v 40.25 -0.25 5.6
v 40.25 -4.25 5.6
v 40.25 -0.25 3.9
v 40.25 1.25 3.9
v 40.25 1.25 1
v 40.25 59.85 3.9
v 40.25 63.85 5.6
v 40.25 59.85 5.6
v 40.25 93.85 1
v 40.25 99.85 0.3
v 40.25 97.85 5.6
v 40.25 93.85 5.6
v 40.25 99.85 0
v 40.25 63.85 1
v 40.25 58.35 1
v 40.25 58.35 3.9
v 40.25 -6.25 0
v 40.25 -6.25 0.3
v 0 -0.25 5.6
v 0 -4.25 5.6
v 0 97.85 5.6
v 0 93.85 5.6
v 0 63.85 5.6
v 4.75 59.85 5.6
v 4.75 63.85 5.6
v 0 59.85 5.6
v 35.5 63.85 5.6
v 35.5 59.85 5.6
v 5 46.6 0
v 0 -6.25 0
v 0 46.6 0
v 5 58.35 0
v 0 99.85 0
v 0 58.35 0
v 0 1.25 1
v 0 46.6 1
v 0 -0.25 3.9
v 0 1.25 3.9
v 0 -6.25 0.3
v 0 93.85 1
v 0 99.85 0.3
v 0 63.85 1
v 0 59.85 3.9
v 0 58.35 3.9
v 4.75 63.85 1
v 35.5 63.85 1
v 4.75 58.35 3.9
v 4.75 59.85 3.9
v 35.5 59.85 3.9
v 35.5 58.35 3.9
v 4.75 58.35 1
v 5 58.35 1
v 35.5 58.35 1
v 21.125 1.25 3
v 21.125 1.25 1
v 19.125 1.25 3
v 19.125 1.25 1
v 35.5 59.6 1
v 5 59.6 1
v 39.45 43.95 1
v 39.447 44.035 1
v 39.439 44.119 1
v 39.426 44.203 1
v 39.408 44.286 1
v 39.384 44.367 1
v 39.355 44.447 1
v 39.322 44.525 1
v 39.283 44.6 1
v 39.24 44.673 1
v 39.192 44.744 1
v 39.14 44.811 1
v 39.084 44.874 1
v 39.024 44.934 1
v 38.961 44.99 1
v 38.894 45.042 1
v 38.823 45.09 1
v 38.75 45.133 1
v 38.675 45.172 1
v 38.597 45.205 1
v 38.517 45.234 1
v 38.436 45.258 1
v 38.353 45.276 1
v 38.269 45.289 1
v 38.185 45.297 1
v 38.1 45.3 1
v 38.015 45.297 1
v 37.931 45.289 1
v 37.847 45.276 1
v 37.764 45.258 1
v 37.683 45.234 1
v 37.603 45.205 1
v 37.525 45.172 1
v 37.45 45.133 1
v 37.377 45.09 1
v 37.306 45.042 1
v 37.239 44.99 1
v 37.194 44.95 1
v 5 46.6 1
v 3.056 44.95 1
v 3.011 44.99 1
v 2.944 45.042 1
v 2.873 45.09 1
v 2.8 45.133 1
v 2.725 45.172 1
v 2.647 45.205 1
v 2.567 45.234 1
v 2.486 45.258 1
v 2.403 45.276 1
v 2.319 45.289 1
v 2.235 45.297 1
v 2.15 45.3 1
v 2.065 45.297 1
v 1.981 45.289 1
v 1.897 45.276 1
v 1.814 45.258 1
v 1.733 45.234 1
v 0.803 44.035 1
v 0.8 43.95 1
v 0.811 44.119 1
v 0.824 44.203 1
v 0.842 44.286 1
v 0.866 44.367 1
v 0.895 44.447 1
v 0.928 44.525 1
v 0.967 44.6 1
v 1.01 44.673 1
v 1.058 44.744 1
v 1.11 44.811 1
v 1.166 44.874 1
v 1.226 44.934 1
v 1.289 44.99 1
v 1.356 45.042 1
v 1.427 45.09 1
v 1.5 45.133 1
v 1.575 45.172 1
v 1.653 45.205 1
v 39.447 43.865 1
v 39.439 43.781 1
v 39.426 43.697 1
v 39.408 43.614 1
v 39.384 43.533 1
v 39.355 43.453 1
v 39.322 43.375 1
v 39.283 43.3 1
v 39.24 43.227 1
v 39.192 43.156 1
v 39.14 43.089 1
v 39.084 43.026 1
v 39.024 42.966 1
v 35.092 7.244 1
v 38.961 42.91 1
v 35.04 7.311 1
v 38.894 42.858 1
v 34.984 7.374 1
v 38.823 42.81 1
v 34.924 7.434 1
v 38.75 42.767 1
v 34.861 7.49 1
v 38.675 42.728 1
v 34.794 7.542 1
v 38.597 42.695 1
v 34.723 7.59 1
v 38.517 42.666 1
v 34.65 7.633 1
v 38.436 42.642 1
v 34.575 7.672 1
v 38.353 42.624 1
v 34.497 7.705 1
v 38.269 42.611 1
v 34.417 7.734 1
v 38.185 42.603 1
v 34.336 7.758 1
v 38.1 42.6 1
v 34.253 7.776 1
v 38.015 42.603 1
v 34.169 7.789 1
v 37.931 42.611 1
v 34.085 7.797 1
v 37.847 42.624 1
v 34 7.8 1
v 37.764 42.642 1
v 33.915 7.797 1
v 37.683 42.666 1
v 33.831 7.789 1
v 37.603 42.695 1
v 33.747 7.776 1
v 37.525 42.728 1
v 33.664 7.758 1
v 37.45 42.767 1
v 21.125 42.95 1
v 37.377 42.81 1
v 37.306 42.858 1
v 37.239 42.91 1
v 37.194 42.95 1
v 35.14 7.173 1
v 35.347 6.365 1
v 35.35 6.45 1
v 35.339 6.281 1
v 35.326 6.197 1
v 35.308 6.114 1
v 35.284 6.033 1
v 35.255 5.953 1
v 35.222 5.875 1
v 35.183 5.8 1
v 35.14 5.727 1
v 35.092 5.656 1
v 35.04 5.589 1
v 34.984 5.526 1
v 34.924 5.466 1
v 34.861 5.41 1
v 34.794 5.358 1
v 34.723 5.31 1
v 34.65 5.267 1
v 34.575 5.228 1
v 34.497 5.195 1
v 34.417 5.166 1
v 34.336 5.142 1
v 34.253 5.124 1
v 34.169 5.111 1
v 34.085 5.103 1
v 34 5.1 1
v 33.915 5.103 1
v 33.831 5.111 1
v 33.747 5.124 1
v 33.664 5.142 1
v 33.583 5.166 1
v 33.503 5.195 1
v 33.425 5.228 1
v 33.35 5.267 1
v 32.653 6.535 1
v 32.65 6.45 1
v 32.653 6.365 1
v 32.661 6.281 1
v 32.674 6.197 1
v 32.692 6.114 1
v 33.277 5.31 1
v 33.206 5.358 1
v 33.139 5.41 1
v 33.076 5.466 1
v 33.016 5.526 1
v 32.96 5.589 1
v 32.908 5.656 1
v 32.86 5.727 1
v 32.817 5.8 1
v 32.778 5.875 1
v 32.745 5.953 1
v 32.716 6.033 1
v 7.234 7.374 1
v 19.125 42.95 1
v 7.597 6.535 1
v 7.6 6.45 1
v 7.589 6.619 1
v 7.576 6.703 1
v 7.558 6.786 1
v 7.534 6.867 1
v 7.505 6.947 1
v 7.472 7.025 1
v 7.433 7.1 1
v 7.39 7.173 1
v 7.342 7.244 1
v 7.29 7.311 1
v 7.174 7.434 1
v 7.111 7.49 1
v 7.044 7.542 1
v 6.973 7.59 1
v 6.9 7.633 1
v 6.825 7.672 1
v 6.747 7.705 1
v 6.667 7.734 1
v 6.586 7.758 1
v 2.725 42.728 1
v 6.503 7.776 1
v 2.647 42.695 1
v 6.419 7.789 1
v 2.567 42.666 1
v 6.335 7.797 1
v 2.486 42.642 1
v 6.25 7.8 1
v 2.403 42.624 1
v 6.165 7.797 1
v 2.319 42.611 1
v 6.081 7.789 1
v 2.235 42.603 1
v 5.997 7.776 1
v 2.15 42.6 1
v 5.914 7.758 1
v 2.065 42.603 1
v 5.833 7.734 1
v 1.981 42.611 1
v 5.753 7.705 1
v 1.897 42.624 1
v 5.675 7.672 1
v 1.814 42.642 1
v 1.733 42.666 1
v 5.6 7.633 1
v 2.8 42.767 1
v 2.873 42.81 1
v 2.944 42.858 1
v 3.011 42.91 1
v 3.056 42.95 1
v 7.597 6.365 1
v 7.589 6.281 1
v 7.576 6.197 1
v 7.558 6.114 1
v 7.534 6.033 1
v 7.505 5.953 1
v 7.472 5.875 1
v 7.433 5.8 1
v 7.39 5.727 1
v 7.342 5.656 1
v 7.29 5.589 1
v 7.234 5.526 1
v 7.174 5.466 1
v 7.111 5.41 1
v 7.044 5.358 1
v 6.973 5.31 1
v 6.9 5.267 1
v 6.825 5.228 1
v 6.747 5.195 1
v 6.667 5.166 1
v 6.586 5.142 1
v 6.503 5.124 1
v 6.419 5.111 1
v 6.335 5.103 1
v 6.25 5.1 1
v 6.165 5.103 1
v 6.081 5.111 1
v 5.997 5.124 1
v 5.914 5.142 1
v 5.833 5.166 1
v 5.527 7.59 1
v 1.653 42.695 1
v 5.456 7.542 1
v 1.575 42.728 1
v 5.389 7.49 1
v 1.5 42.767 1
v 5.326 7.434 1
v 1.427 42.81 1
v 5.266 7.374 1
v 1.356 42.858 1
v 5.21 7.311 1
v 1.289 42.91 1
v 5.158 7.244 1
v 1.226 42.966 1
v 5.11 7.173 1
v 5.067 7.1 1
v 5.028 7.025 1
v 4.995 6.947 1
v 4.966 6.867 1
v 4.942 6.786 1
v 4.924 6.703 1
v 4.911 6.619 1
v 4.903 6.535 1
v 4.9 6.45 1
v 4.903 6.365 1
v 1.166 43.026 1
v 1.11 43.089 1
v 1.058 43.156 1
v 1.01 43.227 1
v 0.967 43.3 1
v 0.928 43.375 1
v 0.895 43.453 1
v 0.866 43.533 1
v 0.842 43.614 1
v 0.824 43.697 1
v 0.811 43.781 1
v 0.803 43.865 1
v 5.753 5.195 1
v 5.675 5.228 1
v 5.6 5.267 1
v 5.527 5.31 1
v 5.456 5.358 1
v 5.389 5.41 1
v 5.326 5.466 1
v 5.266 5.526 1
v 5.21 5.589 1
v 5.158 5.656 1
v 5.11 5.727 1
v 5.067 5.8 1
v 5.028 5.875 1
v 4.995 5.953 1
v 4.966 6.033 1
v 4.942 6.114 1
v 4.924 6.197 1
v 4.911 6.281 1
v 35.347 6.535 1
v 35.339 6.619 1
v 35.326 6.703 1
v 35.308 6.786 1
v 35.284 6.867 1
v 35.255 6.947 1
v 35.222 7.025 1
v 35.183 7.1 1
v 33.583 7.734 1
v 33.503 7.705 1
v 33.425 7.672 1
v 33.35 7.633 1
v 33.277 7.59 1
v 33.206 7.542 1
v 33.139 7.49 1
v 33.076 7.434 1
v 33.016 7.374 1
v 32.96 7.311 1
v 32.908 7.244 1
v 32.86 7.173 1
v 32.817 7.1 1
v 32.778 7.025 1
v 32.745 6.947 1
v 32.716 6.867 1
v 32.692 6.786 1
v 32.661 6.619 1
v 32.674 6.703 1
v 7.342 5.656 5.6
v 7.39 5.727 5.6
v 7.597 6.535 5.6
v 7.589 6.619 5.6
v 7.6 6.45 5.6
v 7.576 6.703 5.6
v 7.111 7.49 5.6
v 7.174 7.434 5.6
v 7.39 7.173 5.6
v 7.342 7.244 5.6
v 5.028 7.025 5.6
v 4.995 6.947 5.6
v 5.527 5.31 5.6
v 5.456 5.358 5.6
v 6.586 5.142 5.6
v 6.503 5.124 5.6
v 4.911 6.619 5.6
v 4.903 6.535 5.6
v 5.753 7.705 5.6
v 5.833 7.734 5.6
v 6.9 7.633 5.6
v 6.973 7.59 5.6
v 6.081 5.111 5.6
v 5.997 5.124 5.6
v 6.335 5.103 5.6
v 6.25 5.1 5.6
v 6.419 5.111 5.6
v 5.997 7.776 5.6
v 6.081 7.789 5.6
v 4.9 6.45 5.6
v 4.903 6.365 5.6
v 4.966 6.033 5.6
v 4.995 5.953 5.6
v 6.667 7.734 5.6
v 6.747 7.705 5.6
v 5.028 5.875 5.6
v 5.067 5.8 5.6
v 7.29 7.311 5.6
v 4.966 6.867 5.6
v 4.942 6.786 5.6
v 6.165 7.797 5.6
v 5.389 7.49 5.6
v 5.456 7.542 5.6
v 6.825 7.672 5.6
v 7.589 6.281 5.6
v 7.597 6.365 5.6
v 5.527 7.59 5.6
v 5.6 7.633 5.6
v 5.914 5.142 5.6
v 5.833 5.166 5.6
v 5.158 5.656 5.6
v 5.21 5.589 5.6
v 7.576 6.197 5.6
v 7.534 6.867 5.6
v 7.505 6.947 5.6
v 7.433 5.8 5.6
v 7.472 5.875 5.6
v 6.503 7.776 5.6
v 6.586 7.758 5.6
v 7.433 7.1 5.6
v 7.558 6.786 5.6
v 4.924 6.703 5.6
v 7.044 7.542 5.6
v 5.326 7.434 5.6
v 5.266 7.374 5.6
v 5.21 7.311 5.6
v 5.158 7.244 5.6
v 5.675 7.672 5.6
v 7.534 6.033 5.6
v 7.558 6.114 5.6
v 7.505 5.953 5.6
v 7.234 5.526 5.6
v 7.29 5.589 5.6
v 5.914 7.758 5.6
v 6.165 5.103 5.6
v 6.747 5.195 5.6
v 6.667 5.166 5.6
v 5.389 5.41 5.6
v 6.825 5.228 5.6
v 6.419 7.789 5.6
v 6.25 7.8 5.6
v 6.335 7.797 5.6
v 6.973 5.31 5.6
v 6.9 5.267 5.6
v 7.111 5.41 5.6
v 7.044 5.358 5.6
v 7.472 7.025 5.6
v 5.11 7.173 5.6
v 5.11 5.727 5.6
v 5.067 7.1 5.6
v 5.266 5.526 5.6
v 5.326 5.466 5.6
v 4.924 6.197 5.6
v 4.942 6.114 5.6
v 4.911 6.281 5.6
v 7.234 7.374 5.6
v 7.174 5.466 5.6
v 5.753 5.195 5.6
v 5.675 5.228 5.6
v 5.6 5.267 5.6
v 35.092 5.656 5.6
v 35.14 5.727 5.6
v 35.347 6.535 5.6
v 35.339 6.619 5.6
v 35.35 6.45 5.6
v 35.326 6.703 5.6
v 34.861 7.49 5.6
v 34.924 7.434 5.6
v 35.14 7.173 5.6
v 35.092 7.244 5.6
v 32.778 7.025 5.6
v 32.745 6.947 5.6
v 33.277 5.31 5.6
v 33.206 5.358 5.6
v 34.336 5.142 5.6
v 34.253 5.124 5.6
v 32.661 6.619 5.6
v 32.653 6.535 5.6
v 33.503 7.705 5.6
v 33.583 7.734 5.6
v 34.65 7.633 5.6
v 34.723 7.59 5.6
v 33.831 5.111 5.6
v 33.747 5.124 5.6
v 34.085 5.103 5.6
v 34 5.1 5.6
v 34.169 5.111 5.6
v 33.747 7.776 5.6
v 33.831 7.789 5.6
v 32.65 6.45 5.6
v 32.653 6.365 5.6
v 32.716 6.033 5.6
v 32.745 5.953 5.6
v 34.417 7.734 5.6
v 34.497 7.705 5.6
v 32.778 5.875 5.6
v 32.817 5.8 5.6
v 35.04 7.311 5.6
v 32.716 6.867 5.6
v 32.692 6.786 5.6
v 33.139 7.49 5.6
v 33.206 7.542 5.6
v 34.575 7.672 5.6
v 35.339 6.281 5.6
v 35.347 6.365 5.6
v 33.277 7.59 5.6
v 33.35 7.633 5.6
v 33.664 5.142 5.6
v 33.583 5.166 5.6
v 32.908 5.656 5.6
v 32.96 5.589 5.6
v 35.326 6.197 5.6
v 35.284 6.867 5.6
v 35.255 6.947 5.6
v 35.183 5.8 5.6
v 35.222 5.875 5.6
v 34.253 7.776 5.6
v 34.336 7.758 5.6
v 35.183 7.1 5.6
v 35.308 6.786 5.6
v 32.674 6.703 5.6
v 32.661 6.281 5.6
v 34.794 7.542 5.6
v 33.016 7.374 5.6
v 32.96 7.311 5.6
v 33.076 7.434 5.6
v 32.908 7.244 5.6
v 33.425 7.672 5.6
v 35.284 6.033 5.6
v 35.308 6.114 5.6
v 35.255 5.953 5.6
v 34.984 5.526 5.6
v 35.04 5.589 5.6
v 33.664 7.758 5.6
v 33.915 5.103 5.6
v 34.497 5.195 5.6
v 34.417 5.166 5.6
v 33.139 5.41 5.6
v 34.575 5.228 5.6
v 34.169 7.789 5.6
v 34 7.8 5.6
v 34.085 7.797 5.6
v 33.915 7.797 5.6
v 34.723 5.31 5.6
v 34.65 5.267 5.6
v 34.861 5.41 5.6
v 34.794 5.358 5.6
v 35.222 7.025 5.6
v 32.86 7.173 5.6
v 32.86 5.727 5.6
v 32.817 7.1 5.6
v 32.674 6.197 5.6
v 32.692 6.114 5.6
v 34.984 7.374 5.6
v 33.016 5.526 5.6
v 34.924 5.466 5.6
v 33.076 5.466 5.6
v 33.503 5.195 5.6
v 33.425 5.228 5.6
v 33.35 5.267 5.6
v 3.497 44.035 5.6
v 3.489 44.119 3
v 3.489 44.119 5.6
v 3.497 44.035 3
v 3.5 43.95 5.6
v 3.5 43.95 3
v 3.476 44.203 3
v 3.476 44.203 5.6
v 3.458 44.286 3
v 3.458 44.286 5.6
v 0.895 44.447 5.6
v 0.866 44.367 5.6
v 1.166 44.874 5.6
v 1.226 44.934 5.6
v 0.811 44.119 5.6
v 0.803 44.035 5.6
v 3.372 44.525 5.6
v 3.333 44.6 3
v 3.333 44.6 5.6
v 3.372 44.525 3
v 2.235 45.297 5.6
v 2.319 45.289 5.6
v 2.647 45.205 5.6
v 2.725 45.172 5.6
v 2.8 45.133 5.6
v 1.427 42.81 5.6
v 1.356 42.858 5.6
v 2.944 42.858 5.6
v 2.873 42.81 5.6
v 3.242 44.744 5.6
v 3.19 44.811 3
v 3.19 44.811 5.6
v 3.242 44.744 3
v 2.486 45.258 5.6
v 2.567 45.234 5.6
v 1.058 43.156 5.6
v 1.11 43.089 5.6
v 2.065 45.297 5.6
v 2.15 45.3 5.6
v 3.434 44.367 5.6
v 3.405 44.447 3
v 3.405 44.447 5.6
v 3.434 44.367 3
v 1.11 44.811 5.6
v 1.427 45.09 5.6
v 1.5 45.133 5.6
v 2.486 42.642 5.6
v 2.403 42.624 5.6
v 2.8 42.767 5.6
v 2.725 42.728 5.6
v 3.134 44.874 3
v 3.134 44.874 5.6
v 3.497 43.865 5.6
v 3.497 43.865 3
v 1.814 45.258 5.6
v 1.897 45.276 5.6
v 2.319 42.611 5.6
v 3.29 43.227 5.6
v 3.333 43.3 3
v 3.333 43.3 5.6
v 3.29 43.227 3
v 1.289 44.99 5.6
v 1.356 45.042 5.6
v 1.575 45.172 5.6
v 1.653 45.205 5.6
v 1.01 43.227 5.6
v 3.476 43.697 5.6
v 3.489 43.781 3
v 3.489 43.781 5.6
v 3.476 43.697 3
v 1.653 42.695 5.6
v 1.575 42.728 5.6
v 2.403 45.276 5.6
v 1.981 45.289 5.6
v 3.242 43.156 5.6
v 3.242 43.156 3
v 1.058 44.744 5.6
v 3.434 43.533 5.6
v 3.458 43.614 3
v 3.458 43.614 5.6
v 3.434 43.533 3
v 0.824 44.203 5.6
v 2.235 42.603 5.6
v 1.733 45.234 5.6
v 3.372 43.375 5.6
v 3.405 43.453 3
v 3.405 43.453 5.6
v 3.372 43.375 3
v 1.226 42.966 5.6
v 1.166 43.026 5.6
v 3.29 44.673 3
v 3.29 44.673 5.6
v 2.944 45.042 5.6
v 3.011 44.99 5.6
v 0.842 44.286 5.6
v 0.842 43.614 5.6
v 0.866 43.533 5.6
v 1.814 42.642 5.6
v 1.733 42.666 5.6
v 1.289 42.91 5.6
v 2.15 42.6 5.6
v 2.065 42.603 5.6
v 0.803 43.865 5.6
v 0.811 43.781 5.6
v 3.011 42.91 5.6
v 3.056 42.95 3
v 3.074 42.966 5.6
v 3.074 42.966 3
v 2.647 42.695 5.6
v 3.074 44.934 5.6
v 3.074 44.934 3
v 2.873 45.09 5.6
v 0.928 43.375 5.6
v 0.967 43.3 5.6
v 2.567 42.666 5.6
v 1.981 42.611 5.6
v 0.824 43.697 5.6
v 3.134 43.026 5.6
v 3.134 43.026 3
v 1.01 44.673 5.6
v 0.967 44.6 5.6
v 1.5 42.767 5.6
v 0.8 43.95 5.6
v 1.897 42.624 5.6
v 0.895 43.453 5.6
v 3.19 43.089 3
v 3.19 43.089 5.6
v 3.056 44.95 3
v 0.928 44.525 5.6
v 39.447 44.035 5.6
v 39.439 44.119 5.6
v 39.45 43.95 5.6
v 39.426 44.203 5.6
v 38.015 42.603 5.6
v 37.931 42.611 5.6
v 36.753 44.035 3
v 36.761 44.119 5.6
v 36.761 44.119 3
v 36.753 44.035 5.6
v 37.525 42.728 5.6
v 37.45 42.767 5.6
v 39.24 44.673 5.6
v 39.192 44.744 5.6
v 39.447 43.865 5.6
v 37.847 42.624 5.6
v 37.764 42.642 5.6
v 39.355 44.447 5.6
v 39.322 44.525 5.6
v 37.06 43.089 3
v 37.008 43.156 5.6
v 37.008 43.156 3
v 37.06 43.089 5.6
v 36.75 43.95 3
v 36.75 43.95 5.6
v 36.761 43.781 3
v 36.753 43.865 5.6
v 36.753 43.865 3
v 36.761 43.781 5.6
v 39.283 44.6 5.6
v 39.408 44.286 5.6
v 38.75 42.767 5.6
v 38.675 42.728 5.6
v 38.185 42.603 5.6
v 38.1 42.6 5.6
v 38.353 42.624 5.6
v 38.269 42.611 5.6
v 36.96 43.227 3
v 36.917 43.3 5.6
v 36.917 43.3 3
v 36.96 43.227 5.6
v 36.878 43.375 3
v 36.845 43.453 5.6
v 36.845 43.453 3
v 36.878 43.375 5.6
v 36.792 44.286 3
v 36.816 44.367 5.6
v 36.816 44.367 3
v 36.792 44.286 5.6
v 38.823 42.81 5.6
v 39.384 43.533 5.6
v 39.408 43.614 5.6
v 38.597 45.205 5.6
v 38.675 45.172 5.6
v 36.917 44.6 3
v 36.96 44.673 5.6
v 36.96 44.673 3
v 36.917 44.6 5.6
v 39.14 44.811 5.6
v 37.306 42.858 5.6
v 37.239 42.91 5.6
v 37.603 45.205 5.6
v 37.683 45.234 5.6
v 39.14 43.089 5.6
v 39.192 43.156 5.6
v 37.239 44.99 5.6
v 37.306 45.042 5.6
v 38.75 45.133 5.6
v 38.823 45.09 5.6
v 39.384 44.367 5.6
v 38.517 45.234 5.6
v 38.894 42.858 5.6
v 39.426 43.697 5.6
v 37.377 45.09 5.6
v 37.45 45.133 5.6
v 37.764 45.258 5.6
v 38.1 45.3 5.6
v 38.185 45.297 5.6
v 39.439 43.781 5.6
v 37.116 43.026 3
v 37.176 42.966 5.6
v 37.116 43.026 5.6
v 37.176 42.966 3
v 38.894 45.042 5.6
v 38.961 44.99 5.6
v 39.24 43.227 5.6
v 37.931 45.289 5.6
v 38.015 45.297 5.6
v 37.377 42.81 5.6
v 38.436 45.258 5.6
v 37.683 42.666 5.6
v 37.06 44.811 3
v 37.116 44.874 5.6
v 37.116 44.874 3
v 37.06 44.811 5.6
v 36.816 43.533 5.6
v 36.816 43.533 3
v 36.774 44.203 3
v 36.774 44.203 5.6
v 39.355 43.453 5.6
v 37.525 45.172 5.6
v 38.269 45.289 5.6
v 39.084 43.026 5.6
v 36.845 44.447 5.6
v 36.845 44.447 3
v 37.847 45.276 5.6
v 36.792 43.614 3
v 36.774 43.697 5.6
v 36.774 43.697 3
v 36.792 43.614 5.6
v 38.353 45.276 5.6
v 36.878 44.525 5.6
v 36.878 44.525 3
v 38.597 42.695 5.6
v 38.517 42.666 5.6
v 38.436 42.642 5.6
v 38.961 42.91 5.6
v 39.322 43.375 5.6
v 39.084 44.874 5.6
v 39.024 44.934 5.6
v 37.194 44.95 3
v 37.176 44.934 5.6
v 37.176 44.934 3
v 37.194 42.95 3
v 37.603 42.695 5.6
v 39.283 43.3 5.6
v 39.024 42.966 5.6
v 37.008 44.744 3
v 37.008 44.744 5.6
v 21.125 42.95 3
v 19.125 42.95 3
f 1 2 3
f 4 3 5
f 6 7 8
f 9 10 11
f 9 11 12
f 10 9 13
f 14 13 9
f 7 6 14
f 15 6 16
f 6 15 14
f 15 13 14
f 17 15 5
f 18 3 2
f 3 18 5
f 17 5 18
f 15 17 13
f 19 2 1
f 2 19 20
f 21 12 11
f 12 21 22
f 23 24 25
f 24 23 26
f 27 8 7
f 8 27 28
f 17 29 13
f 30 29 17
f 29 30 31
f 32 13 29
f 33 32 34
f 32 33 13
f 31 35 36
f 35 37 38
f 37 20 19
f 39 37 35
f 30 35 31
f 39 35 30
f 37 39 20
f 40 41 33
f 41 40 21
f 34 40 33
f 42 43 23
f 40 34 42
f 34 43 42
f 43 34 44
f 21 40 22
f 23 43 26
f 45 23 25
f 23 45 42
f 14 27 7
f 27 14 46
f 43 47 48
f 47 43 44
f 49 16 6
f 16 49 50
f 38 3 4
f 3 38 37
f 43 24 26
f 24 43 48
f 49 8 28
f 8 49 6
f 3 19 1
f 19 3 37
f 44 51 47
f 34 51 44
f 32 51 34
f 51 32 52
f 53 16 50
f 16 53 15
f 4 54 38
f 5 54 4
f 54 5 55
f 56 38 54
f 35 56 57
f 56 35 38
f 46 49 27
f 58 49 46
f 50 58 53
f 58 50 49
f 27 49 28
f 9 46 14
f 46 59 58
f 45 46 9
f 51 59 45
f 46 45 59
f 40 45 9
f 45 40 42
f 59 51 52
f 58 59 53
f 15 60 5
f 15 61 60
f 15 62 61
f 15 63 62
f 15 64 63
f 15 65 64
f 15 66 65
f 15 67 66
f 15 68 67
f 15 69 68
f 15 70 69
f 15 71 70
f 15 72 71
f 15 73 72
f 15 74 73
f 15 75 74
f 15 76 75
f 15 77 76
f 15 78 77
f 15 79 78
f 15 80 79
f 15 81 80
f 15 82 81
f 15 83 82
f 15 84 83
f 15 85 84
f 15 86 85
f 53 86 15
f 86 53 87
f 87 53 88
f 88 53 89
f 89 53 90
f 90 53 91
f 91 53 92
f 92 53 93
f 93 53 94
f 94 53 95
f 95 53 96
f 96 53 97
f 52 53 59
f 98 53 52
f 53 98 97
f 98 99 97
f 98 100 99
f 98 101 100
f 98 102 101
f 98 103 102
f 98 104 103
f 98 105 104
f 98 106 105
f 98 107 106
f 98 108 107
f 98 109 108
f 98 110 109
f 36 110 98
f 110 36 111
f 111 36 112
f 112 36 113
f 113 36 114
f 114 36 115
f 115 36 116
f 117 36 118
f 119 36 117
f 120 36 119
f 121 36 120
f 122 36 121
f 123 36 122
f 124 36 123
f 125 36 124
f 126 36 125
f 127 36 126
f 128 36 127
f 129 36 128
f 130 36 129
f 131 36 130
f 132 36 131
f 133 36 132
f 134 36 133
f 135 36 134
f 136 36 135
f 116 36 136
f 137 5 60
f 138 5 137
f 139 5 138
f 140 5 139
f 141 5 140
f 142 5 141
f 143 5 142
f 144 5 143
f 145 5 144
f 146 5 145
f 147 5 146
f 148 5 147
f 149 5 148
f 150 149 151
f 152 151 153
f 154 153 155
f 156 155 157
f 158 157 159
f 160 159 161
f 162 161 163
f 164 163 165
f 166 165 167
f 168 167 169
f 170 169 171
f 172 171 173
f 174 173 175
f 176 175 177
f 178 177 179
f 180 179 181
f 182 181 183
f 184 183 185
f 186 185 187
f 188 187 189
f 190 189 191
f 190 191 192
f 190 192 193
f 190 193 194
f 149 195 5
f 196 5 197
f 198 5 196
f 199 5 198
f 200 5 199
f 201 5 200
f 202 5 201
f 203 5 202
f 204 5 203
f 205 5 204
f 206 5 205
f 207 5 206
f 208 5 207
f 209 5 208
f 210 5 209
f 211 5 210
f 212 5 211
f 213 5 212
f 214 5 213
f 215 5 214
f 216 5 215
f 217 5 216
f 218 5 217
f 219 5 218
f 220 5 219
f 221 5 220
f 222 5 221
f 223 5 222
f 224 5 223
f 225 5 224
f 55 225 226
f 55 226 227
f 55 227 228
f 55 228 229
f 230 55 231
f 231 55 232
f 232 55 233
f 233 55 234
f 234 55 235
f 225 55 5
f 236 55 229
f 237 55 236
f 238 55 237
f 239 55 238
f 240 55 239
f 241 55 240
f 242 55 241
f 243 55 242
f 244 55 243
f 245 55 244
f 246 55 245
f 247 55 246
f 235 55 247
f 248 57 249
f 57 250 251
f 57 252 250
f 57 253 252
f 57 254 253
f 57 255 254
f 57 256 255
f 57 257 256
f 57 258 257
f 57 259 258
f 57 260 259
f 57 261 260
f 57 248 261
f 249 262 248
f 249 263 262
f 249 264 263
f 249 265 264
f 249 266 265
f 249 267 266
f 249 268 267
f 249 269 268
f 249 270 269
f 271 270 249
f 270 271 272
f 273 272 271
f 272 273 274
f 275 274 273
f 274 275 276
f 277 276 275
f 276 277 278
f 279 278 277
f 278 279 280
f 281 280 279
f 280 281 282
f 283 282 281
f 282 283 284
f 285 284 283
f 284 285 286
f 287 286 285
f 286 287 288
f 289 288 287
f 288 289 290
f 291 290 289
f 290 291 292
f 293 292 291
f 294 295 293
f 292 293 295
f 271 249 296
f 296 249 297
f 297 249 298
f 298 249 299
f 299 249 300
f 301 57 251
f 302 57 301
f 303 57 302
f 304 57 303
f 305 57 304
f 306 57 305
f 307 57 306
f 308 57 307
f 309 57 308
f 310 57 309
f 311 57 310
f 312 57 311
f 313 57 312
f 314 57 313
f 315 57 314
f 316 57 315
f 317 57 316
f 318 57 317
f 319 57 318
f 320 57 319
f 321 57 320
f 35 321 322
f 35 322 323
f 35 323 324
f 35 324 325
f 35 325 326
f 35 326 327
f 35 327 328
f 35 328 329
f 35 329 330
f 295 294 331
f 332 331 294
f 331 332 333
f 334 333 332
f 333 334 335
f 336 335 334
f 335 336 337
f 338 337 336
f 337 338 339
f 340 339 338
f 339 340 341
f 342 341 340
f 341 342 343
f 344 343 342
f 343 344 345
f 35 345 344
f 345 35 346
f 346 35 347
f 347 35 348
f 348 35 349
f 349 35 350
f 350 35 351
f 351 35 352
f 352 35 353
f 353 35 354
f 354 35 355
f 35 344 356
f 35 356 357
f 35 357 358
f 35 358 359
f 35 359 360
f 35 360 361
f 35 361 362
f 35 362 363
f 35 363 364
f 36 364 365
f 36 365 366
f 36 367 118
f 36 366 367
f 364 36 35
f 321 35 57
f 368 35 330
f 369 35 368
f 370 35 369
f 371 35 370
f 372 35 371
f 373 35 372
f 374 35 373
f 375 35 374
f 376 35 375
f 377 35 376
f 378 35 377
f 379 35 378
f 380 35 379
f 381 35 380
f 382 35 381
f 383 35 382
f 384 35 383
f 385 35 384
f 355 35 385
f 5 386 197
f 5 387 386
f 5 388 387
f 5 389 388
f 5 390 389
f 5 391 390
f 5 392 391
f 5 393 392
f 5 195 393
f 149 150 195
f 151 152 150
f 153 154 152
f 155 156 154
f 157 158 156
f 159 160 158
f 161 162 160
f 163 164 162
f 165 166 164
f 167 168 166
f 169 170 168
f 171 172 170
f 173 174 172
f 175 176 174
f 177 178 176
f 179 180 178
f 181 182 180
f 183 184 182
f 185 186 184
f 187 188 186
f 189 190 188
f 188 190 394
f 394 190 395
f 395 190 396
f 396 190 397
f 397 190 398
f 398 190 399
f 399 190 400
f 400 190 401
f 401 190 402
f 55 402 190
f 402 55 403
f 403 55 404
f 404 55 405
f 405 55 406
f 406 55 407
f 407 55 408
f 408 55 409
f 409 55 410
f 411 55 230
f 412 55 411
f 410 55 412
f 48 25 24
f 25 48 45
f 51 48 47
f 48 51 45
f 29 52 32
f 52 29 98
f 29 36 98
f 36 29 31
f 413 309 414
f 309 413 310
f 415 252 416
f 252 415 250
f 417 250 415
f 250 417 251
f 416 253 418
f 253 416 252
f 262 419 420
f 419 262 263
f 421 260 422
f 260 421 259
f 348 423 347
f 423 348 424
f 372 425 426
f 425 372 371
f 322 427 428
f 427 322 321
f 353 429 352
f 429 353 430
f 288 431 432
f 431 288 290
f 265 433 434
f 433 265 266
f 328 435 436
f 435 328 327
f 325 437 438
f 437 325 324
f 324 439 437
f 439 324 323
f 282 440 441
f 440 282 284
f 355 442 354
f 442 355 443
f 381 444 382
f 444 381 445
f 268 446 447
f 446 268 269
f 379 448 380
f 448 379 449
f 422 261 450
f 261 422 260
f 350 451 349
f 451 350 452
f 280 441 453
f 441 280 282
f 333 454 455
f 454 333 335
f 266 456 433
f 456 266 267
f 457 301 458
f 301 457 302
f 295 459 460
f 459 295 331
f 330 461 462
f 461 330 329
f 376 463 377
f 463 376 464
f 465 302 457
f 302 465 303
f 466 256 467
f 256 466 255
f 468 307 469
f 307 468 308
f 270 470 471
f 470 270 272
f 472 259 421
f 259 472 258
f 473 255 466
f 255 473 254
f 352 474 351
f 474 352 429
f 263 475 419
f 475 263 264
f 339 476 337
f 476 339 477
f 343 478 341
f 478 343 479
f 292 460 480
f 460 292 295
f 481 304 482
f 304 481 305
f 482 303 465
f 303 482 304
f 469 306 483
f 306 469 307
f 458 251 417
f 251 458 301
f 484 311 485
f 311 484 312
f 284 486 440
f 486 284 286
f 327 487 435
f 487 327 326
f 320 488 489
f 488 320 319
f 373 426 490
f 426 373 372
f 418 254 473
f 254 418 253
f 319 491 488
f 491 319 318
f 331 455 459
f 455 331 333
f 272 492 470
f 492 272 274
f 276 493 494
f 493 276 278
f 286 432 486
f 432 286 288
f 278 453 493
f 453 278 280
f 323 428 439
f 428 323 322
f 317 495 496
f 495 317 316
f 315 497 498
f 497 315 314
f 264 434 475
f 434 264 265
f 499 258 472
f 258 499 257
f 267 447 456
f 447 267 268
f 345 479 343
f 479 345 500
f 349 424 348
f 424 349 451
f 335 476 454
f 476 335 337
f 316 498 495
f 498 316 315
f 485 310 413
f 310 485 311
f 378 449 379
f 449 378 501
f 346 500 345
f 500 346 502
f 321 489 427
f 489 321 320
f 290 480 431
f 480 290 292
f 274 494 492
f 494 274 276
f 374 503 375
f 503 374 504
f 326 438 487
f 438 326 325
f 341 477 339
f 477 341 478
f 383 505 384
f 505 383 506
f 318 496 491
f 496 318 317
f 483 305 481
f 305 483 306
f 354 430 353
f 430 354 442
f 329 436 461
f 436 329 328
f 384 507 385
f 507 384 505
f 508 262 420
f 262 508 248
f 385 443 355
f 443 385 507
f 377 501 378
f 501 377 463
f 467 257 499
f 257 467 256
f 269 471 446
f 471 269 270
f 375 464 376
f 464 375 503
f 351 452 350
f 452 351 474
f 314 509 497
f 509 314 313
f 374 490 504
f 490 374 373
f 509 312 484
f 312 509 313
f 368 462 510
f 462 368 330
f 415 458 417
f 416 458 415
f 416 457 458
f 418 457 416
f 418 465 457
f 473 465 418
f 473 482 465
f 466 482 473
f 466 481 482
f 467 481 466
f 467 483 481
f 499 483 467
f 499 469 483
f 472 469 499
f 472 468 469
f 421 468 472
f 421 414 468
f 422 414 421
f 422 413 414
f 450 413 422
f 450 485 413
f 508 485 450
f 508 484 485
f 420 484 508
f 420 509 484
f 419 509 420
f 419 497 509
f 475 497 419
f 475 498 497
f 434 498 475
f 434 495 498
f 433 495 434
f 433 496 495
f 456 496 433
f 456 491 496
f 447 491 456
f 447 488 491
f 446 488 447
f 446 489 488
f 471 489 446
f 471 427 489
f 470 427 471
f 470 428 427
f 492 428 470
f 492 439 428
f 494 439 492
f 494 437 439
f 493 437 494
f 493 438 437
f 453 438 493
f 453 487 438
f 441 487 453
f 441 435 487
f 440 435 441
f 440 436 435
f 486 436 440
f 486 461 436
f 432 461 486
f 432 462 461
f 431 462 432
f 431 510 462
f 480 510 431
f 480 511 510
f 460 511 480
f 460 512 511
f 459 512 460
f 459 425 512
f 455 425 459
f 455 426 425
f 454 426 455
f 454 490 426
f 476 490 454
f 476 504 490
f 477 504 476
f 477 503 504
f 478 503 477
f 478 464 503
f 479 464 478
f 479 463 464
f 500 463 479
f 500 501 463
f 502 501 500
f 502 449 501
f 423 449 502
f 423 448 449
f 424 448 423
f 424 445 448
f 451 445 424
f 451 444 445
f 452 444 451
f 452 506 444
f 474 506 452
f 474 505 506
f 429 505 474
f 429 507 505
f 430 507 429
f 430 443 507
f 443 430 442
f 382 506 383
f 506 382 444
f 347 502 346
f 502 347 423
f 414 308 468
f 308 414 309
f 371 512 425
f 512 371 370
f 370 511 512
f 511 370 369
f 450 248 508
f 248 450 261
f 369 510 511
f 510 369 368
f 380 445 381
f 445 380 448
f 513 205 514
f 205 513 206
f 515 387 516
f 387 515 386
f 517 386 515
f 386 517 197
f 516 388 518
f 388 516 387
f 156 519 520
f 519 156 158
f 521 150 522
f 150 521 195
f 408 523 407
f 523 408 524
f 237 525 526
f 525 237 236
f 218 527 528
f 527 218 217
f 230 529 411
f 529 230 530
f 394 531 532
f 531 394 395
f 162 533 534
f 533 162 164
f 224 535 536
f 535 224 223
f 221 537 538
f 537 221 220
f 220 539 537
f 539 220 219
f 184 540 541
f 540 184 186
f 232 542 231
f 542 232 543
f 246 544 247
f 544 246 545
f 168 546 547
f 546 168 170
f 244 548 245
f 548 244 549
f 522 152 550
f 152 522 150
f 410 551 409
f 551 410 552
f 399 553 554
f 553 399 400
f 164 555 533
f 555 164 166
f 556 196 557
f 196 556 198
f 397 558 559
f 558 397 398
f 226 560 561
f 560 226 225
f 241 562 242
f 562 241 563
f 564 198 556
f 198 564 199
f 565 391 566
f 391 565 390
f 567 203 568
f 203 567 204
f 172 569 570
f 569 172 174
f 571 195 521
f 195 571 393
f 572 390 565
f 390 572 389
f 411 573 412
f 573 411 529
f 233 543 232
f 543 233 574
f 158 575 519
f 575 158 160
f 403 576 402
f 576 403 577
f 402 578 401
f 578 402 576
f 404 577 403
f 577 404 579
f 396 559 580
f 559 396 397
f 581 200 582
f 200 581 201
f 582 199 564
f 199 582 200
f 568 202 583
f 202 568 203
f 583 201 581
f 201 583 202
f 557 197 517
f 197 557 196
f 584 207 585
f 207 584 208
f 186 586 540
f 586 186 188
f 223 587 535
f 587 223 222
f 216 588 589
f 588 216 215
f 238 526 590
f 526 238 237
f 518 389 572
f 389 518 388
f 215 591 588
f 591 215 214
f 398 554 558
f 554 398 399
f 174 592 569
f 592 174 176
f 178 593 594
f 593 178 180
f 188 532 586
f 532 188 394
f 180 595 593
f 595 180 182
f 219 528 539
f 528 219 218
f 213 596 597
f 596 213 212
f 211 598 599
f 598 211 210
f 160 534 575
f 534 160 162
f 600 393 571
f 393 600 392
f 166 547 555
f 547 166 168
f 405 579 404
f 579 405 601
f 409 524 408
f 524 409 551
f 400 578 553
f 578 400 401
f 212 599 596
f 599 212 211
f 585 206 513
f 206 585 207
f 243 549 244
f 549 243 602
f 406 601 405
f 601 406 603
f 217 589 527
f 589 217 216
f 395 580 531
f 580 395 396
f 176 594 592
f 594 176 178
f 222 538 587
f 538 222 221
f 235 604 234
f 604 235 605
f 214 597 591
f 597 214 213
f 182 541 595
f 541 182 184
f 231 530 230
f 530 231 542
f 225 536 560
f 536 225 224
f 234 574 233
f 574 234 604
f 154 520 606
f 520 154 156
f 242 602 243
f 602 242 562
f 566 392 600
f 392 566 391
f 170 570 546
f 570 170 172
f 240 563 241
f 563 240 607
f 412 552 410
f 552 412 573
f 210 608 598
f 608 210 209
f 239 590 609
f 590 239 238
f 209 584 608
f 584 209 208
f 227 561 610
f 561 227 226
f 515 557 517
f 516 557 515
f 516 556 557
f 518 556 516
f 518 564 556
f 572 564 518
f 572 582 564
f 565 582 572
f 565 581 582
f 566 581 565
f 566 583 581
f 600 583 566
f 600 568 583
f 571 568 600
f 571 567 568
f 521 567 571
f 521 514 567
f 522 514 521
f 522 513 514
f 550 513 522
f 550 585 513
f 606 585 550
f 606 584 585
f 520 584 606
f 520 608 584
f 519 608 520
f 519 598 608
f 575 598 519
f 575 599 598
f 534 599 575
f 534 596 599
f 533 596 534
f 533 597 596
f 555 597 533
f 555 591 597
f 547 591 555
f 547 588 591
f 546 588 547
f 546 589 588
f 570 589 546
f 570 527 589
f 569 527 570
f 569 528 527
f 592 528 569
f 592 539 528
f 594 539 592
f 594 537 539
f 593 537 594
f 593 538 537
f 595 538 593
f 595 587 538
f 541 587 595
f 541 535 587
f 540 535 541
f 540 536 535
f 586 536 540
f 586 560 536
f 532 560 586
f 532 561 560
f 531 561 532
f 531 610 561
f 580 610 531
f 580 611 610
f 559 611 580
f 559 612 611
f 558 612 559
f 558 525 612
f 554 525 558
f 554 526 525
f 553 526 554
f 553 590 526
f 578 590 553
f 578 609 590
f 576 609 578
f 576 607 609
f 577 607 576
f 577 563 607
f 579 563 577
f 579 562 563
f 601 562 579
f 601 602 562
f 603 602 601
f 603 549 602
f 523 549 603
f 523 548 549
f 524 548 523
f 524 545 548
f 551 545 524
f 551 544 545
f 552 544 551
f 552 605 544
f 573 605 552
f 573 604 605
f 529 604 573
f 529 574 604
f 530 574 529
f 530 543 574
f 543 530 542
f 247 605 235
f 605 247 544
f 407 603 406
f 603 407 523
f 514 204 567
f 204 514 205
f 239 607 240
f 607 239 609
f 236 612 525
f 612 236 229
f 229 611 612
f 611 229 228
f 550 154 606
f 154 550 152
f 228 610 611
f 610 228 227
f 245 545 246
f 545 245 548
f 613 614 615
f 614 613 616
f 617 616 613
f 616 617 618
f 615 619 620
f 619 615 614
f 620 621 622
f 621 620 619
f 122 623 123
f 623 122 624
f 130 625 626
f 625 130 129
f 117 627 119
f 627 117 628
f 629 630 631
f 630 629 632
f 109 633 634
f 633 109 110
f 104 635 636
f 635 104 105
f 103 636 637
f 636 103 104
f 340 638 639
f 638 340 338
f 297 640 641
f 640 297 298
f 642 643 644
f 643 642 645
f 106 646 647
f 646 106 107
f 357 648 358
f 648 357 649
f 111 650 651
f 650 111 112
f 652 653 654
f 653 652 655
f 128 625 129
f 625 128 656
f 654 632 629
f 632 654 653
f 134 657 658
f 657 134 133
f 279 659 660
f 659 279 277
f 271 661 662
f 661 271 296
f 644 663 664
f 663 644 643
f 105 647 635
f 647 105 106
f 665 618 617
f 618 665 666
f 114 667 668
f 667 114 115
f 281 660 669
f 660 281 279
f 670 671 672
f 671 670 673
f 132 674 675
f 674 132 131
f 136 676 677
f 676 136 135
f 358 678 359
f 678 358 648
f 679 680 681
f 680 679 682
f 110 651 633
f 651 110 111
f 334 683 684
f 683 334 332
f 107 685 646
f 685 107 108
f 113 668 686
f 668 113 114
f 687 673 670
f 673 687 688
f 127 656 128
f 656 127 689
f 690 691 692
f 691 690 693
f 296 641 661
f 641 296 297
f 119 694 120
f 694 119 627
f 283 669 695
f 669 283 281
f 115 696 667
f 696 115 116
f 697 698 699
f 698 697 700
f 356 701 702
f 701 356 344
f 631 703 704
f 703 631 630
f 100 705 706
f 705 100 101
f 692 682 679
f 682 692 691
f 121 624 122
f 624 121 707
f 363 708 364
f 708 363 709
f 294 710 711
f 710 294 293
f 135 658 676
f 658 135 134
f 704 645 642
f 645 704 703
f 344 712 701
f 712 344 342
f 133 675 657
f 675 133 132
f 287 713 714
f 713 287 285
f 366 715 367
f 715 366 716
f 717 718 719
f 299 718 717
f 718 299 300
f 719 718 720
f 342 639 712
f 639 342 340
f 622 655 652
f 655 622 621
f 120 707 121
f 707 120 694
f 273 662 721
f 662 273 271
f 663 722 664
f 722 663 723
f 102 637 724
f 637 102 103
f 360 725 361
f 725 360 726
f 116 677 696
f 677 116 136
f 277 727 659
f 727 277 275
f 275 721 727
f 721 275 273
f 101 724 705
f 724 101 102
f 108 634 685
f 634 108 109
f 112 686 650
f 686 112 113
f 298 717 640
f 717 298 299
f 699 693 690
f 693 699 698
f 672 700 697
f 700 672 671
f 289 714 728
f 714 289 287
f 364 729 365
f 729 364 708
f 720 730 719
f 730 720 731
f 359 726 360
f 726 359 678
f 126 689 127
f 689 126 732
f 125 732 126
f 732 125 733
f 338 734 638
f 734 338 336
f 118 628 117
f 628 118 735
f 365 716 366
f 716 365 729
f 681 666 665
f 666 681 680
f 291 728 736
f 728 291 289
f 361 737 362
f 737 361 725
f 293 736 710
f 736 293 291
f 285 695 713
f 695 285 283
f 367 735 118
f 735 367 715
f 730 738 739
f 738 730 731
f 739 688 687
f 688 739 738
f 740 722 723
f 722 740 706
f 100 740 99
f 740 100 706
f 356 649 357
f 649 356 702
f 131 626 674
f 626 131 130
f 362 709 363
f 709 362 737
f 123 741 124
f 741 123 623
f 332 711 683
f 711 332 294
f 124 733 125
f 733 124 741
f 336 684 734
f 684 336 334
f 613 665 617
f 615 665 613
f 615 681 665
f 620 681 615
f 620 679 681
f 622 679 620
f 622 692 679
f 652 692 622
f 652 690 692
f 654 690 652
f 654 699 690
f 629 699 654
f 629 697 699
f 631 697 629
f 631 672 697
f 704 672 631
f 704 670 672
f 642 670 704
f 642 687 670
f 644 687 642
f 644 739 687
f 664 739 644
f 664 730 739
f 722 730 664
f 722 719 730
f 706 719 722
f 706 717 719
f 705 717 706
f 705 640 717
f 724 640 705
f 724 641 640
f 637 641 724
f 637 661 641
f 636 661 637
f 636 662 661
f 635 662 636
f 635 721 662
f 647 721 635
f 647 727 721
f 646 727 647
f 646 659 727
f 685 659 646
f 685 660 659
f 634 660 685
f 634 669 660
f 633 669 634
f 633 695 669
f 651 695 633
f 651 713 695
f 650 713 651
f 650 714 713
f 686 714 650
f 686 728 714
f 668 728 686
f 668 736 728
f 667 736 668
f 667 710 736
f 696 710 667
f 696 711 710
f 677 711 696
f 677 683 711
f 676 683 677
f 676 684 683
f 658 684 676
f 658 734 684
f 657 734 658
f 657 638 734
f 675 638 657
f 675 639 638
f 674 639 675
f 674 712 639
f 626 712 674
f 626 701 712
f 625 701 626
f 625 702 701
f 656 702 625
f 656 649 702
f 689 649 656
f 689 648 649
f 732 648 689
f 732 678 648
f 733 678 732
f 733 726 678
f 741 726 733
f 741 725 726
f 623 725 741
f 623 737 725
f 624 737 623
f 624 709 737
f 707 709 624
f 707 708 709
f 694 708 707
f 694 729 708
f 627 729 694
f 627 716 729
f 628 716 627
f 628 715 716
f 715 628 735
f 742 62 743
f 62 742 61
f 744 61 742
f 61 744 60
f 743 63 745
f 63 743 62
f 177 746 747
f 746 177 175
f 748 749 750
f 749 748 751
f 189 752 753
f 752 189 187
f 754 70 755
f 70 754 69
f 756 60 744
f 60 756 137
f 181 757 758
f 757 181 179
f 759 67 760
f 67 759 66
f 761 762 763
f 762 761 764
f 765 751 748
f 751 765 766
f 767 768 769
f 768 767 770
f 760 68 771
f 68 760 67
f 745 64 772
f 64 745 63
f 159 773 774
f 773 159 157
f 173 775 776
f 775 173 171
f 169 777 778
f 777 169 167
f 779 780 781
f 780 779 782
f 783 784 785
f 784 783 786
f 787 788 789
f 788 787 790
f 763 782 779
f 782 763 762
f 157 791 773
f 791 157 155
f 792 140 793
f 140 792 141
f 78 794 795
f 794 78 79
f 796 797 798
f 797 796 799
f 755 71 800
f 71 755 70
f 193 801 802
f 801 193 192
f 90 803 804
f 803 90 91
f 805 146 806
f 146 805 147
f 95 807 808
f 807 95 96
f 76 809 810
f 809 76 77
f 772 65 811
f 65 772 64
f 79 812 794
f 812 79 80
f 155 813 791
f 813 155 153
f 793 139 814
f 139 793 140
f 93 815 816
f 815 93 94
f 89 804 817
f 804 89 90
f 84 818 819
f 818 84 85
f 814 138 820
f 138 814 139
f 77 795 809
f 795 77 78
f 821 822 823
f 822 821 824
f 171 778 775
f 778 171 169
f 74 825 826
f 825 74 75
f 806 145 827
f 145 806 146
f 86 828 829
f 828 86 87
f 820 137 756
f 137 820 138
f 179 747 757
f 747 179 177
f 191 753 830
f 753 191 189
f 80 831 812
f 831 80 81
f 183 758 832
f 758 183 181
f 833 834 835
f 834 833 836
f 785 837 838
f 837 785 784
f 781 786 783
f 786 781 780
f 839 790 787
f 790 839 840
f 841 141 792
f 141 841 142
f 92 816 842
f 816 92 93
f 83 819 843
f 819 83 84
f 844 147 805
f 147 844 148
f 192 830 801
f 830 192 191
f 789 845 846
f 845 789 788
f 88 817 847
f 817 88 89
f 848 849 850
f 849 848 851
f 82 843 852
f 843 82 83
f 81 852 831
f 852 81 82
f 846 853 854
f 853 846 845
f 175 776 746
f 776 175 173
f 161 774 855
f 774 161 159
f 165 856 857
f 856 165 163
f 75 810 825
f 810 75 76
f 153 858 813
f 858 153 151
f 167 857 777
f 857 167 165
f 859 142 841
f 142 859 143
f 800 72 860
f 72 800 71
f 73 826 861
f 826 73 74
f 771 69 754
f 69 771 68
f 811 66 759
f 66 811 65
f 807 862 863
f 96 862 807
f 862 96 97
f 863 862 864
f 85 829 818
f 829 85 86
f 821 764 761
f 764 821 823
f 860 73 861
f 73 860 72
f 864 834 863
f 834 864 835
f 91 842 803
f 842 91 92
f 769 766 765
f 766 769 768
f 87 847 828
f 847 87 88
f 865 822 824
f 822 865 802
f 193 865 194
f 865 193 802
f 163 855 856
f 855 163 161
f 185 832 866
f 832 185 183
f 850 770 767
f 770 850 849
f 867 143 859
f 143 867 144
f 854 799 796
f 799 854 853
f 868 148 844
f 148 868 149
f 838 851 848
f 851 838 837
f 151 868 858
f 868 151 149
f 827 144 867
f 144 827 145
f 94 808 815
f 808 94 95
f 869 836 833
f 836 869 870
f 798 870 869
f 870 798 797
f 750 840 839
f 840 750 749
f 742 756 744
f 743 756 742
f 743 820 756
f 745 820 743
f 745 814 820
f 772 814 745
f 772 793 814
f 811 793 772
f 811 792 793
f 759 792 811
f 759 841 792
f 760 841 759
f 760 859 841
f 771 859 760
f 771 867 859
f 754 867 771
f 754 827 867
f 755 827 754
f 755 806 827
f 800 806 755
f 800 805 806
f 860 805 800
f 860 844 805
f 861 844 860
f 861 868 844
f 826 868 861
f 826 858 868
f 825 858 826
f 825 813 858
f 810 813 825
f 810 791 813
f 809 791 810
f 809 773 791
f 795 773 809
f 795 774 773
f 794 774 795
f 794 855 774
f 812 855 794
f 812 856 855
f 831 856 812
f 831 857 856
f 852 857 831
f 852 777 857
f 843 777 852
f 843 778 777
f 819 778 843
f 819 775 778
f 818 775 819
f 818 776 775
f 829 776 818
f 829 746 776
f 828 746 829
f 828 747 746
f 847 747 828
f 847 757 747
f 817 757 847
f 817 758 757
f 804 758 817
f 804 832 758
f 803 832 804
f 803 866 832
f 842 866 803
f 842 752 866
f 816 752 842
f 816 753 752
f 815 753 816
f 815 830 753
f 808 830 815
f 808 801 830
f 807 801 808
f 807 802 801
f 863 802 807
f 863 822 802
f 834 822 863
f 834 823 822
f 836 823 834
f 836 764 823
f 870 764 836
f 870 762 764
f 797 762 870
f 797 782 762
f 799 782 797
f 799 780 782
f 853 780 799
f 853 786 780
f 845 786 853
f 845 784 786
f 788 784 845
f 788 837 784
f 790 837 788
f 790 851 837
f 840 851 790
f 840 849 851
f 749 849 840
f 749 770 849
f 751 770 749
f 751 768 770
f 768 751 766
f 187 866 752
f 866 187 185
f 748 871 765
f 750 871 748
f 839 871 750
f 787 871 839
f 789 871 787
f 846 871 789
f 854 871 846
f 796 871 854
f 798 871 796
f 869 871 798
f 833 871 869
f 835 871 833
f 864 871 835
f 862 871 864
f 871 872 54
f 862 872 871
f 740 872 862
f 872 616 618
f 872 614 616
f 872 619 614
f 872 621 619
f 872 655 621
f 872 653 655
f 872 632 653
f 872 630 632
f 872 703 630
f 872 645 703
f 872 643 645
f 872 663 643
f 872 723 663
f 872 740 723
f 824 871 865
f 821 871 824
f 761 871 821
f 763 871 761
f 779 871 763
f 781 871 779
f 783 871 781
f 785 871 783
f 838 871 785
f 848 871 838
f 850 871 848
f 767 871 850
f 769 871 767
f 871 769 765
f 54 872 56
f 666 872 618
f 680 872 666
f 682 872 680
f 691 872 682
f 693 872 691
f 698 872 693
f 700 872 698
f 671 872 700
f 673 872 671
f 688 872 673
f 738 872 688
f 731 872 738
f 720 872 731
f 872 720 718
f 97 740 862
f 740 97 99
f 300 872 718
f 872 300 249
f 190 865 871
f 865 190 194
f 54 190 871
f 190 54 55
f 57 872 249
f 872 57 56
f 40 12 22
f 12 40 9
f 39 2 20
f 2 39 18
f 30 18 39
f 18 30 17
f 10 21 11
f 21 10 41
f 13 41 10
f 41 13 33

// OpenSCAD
$fn=100;
default_thick = 2;
min_thick = 0.3;

a_few = 10;
play = 0.25;

sensor_width_margin = 0.4;

sensor_length = 59.6;
sensor_width = 39.45 + sensor_width_margin*2;
sensor_thick = 1.5;

sensor_hole_d = 2.7;
sensor_hole_r = sensor_hole_d/2;
sensor_back_hole_x = 4.9 + sensor_hole_r;
sensor_back_hole_y = 5.1 + sensor_hole_r;
sensor_front_hole_x = 0.8 + sensor_hole_r ;
sensor_front_hole_y = 14.3 + sensor_hole_r;



quartz_length = 10;
quartz_width = 3.5;
quartz_height = 4.9 + 0.5 - sensor_thick;
quartz_margin = 1;

quartz_x_offset = 0.5;
quartz_y_offset = 2;

sensor_x_padding = 5;
sensor_y_padding = 1.5;


sensor_spot_excess = 0.2;
sensor_spot_y_padding = 4;
sensor_spot_width = sensor_width;
sensor_spot_length = sensor_length + play*2 + sensor_spot_y_padding*2;
sensor_spot_height = quartz_height + sensor_thick + sensor_spot_excess;

sensor_void_length = sensor_length + play*2 - sensor_y_padding*2;

/* ramp_bottom_length = 20; */
ramp_bottom_length = 6;
ramp_top_length = sensor_spot_y_padding;
ramp_height = sensor_spot_height;

base_height = 1;
base_crossbar_width = 10;

base_renforcement_height = 3;
base_renforcement_width = 2;


channel_width = 30;

frame_end_wall_length=play*2 + sensor_length + channel_width + ramp_top_length;
frame_end_wall_connector_void_length=50;

module sensor() {
    translate([0,0,quartz_height])
        union() {
            difference() {
                cube([sensor_width, sensor_length, sensor_thick]);

                translate([sensor_back_hole_x, sensor_back_hole_y, -play])
                    cylinder(r=sensor_hole_r, h=a_few);

                translate([sensor_width-sensor_back_hole_x, sensor_back_hole_y, -play])
                    cylinder(r=sensor_hole_r, h=a_few);

                translate([sensor_front_hole_x, sensor_length - sensor_front_hole_y, -play])
                    cylinder(r=sensor_hole_r, h=a_few);

                translate([sensor_width - sensor_front_hole_x, sensor_length - sensor_front_hole_y, -play])
                    cylinder(r=sensor_hole_r, h=a_few);

            }
            translate([quartz_x_offset, sensor_length-quartz_length-quartz_y_offset, -quartz_height])
                cube([quartz_width,quartz_length,quartz_height]);
        }
}

module ramp_in() {
    hull() {
        translate([0,-ramp_bottom_length -play,0])
            cube([sensor_width, ramp_bottom_length, min_thick]);

        translate([0,-ramp_top_length-play, ramp_height - min_thick ])
            cube([sensor_width, ramp_top_length, min_thick]);
    }
}

module sensor_spot_body() {
    translate([0, -play - sensor_spot_y_padding,0])
        cube([sensor_spot_width, sensor_spot_length, sensor_spot_height]);
}

module sensor_spot_cavity() {
    translate([-play, -play,sensor_spot_height - sensor_thick - sensor_spot_excess])
        cube([sensor_width+play*2, sensor_length + play*2, a_few]);
}

module sensor_spot_void() {
    translate([-play, -play + sensor_y_padding, 0])
        cube([sensor_width+play*2, sensor_void_length, a_few]);
}

module sensor_spot_base() {
        cube([sensor_width, sensor_length, base_height]);
}

/* module sensor_spot_connection_left_void() {

    translate([-play,-play+sensor_y_padding,0])
    cube([(sensor_width-base_crossbar_width)/2+play, sensor_length-sensor_y_padding*2+play*2, a_few]);

}

module sensor_spot_connection_right_void() {

    translate([(sensor_width-base_crossbar_width)/2+base_crossbar_width,-play+sensor_y_padding,0])
    cube([(sensor_width-base_crossbar_width)/2+play, sensor_length-sensor_y_padding*2+play*2, a_few]);

} */

module sensor_spot_connector_void() {
    translate([sensor_x_padding-play, sensor_length - a_few/2, base_height])
        cube([sensor_width-sensor_x_padding*2+play*2, a_few, a_few]);
}

module sensor_spot_quartz_void() {
    translate([0, sensor_length - quartz_length-quartz_y_offset-quartz_margin, 0])
        cube([quartz_width+quartz_x_offset+quartz_margin, quartz_length+quartz_y_offset+quartz_margin, a_few]);
}

module sensor_spot_back_colmuns() {
    translate([sensor_back_hole_x,sensor_back_hole_y,0])
    cylinder(r=sensor_hole_r, h=sensor_spot_height);

    translate([sensor_width-sensor_back_hole_x,sensor_back_hole_y,0])
    cylinder(r=sensor_hole_r, h=sensor_spot_height);
}

module sensor_spot_front_colmuns() {
    translate([sensor_front_hole_x,sensor_length-sensor_front_hole_y,0])
    cylinder(r=sensor_hole_r, h=sensor_spot_height);

    translate([sensor_width-sensor_front_hole_x,sensor_length-sensor_front_hole_y,0])
    cylinder(r=sensor_hole_r, h=sensor_spot_height);
}


module sensor_spot_base_renforcement_y() {
    translate([sensor_width/2-base_renforcement_width/2, 0,0])
        cube([base_renforcement_width, sensor_length-sensor_front_hole_y,  base_renforcement_height]);
}

module sensor_spot_base_renforcement_x() {
    translate([sensor_front_hole_x, sensor_length-sensor_front_hole_y-base_renforcement_width/2,0])
        cube([sensor_width-sensor_front_hole_x*2, base_renforcement_width, base_renforcement_height]);
}

module sensor_spot() {
    difference() {
        sensor_spot_body();
        sensor_spot_cavity();
        sensor_spot_void();
        /* sensor_spot_connection_left_void();
        sensor_spot_connection_right_void(); */
        sensor_spot_connector_void();

    }
    difference() {
        sensor_spot_base();
        sensor_spot_quartz_void();
    }
    sensor_spot_back_colmuns();
    sensor_spot_front_colmuns();

    sensor_spot_base_renforcement_x();
    sensor_spot_base_renforcement_y();
}

module channel_body() {
    translate([0,sensor_length+play,0])
    cube([sensor_width, channel_width + sensor_spot_y_padding*2, sensor_spot_height]);
}
module channel_cavity() {
    translate([-play,sensor_length+play+sensor_spot_y_padding,base_height])
    cube([sensor_width+play*2, channel_width, a_few]);
}

module ramp_out() {
    hull() {
        translate([0,sensor_length+play+sensor_spot_y_padding+channel_width,0])
            cube([sensor_width, ramp_bottom_length, min_thick]);

        translate([0,sensor_length+play+sensor_spot_y_padding+channel_width, ramp_height - min_thick ])
            cube([sensor_width, ramp_top_length, min_thick]);
    }
}

module channel() {
    difference() {
        channel_body();
        sensor_spot_connector_void();
        channel_cavity();
    }

}



module frame_module() {
    ramp_in();
    sensor_spot();
    channel();
    ramp_out();
}




/* OLD
module frame() {

    difference() {

        hull() {
            translate([0,-ramp_bottom_length -play,0])
                cube([sensor_width, sensor_length+ramp_bottom_length + ramp_top_length + play*2, min_thick]);

            translate([0,-ramp_top_length-play, quartz_height+sensor_thick+ sensor_spot_excess - min_thick ])
            cube([sensor_width, sensor_length+ramp_top_length*2 + play*2, min_thick]);
        }

        translate([-play,-play,quartz_height])
            cube([sensor_width+play*2, sensor_length+play*2, a_few]);

        translate([-play,-play,quartz_height])
            cube([sensor_width+play*2, sensor_length+play*2, a_few]);

        translate([-play,-play+sensor_y_padding,base_height])
        cube([sensor_width+play*2, sensor_length-sensor_y_padding*2+play*2, a_few]);

        translate([-play,-play+sensor_y_padding,0])
        cube([(sensor_width-base_crossbar_width)/2+play, sensor_length-sensor_y_padding*2+play*2, a_few]);

        translate([(sensor_width-base_crossbar_width)/2+base_crossbar_width+play,-play+sensor_y_padding,0])
            cube([(sensor_width-base_crossbar_width)/2+play, sensor_length-sensor_y_padding*2+play*2, a_few]);


        translate([sensor_x_padding+play, sensor_length - a_few/2, base_height])
            cube([sensor_width-sensor_x_padding*2-play*2, a_few, a_few]);

        }


} */

/* OLD
 module frame_channel() {
  translate([0,sensor_length+play+ramp_top_length,0])
  cube([sensor_width, channel_width, base_height]);
} */


module frame_end_base() {

    translate([0,-play,0])
    cube([sensor_width, play*2 + sensor_length + channel_width + ramp_top_length,base_height]);

}

module frame_end_wall() {

    translate([0,-play,0])
    cube([ramp_top_length, frame_end_wall_length,sensor_spot_height]);

}

module frame_end_wall_connector_void() {

    translate([0,-play+(frame_end_wall_length-frame_end_wall_connector_void_length)/2,0])
    cube([ramp_top_length, frame_end_wall_connector_void_length,sensor_spot_height]);

}


module frame_end() {
    ramp_in();
    frame_end_base();
    difference() {

        frame_end_wall();
        frame_end_wall_connector_void();
    }
//    sensor_spot();
//    channel();
    ramp_out();
}


frame_module();


/* color("blue")
sensor(); */


/* translate([0,ramp_bottom_length,0])
    union() {
        translate([-sensor_width,0,0])
        frame_end();

        frame_module();

        translate([sensor_width,0,0])
        frame_module();
    } */


/* OLD
frame();

frame_channel(); */
